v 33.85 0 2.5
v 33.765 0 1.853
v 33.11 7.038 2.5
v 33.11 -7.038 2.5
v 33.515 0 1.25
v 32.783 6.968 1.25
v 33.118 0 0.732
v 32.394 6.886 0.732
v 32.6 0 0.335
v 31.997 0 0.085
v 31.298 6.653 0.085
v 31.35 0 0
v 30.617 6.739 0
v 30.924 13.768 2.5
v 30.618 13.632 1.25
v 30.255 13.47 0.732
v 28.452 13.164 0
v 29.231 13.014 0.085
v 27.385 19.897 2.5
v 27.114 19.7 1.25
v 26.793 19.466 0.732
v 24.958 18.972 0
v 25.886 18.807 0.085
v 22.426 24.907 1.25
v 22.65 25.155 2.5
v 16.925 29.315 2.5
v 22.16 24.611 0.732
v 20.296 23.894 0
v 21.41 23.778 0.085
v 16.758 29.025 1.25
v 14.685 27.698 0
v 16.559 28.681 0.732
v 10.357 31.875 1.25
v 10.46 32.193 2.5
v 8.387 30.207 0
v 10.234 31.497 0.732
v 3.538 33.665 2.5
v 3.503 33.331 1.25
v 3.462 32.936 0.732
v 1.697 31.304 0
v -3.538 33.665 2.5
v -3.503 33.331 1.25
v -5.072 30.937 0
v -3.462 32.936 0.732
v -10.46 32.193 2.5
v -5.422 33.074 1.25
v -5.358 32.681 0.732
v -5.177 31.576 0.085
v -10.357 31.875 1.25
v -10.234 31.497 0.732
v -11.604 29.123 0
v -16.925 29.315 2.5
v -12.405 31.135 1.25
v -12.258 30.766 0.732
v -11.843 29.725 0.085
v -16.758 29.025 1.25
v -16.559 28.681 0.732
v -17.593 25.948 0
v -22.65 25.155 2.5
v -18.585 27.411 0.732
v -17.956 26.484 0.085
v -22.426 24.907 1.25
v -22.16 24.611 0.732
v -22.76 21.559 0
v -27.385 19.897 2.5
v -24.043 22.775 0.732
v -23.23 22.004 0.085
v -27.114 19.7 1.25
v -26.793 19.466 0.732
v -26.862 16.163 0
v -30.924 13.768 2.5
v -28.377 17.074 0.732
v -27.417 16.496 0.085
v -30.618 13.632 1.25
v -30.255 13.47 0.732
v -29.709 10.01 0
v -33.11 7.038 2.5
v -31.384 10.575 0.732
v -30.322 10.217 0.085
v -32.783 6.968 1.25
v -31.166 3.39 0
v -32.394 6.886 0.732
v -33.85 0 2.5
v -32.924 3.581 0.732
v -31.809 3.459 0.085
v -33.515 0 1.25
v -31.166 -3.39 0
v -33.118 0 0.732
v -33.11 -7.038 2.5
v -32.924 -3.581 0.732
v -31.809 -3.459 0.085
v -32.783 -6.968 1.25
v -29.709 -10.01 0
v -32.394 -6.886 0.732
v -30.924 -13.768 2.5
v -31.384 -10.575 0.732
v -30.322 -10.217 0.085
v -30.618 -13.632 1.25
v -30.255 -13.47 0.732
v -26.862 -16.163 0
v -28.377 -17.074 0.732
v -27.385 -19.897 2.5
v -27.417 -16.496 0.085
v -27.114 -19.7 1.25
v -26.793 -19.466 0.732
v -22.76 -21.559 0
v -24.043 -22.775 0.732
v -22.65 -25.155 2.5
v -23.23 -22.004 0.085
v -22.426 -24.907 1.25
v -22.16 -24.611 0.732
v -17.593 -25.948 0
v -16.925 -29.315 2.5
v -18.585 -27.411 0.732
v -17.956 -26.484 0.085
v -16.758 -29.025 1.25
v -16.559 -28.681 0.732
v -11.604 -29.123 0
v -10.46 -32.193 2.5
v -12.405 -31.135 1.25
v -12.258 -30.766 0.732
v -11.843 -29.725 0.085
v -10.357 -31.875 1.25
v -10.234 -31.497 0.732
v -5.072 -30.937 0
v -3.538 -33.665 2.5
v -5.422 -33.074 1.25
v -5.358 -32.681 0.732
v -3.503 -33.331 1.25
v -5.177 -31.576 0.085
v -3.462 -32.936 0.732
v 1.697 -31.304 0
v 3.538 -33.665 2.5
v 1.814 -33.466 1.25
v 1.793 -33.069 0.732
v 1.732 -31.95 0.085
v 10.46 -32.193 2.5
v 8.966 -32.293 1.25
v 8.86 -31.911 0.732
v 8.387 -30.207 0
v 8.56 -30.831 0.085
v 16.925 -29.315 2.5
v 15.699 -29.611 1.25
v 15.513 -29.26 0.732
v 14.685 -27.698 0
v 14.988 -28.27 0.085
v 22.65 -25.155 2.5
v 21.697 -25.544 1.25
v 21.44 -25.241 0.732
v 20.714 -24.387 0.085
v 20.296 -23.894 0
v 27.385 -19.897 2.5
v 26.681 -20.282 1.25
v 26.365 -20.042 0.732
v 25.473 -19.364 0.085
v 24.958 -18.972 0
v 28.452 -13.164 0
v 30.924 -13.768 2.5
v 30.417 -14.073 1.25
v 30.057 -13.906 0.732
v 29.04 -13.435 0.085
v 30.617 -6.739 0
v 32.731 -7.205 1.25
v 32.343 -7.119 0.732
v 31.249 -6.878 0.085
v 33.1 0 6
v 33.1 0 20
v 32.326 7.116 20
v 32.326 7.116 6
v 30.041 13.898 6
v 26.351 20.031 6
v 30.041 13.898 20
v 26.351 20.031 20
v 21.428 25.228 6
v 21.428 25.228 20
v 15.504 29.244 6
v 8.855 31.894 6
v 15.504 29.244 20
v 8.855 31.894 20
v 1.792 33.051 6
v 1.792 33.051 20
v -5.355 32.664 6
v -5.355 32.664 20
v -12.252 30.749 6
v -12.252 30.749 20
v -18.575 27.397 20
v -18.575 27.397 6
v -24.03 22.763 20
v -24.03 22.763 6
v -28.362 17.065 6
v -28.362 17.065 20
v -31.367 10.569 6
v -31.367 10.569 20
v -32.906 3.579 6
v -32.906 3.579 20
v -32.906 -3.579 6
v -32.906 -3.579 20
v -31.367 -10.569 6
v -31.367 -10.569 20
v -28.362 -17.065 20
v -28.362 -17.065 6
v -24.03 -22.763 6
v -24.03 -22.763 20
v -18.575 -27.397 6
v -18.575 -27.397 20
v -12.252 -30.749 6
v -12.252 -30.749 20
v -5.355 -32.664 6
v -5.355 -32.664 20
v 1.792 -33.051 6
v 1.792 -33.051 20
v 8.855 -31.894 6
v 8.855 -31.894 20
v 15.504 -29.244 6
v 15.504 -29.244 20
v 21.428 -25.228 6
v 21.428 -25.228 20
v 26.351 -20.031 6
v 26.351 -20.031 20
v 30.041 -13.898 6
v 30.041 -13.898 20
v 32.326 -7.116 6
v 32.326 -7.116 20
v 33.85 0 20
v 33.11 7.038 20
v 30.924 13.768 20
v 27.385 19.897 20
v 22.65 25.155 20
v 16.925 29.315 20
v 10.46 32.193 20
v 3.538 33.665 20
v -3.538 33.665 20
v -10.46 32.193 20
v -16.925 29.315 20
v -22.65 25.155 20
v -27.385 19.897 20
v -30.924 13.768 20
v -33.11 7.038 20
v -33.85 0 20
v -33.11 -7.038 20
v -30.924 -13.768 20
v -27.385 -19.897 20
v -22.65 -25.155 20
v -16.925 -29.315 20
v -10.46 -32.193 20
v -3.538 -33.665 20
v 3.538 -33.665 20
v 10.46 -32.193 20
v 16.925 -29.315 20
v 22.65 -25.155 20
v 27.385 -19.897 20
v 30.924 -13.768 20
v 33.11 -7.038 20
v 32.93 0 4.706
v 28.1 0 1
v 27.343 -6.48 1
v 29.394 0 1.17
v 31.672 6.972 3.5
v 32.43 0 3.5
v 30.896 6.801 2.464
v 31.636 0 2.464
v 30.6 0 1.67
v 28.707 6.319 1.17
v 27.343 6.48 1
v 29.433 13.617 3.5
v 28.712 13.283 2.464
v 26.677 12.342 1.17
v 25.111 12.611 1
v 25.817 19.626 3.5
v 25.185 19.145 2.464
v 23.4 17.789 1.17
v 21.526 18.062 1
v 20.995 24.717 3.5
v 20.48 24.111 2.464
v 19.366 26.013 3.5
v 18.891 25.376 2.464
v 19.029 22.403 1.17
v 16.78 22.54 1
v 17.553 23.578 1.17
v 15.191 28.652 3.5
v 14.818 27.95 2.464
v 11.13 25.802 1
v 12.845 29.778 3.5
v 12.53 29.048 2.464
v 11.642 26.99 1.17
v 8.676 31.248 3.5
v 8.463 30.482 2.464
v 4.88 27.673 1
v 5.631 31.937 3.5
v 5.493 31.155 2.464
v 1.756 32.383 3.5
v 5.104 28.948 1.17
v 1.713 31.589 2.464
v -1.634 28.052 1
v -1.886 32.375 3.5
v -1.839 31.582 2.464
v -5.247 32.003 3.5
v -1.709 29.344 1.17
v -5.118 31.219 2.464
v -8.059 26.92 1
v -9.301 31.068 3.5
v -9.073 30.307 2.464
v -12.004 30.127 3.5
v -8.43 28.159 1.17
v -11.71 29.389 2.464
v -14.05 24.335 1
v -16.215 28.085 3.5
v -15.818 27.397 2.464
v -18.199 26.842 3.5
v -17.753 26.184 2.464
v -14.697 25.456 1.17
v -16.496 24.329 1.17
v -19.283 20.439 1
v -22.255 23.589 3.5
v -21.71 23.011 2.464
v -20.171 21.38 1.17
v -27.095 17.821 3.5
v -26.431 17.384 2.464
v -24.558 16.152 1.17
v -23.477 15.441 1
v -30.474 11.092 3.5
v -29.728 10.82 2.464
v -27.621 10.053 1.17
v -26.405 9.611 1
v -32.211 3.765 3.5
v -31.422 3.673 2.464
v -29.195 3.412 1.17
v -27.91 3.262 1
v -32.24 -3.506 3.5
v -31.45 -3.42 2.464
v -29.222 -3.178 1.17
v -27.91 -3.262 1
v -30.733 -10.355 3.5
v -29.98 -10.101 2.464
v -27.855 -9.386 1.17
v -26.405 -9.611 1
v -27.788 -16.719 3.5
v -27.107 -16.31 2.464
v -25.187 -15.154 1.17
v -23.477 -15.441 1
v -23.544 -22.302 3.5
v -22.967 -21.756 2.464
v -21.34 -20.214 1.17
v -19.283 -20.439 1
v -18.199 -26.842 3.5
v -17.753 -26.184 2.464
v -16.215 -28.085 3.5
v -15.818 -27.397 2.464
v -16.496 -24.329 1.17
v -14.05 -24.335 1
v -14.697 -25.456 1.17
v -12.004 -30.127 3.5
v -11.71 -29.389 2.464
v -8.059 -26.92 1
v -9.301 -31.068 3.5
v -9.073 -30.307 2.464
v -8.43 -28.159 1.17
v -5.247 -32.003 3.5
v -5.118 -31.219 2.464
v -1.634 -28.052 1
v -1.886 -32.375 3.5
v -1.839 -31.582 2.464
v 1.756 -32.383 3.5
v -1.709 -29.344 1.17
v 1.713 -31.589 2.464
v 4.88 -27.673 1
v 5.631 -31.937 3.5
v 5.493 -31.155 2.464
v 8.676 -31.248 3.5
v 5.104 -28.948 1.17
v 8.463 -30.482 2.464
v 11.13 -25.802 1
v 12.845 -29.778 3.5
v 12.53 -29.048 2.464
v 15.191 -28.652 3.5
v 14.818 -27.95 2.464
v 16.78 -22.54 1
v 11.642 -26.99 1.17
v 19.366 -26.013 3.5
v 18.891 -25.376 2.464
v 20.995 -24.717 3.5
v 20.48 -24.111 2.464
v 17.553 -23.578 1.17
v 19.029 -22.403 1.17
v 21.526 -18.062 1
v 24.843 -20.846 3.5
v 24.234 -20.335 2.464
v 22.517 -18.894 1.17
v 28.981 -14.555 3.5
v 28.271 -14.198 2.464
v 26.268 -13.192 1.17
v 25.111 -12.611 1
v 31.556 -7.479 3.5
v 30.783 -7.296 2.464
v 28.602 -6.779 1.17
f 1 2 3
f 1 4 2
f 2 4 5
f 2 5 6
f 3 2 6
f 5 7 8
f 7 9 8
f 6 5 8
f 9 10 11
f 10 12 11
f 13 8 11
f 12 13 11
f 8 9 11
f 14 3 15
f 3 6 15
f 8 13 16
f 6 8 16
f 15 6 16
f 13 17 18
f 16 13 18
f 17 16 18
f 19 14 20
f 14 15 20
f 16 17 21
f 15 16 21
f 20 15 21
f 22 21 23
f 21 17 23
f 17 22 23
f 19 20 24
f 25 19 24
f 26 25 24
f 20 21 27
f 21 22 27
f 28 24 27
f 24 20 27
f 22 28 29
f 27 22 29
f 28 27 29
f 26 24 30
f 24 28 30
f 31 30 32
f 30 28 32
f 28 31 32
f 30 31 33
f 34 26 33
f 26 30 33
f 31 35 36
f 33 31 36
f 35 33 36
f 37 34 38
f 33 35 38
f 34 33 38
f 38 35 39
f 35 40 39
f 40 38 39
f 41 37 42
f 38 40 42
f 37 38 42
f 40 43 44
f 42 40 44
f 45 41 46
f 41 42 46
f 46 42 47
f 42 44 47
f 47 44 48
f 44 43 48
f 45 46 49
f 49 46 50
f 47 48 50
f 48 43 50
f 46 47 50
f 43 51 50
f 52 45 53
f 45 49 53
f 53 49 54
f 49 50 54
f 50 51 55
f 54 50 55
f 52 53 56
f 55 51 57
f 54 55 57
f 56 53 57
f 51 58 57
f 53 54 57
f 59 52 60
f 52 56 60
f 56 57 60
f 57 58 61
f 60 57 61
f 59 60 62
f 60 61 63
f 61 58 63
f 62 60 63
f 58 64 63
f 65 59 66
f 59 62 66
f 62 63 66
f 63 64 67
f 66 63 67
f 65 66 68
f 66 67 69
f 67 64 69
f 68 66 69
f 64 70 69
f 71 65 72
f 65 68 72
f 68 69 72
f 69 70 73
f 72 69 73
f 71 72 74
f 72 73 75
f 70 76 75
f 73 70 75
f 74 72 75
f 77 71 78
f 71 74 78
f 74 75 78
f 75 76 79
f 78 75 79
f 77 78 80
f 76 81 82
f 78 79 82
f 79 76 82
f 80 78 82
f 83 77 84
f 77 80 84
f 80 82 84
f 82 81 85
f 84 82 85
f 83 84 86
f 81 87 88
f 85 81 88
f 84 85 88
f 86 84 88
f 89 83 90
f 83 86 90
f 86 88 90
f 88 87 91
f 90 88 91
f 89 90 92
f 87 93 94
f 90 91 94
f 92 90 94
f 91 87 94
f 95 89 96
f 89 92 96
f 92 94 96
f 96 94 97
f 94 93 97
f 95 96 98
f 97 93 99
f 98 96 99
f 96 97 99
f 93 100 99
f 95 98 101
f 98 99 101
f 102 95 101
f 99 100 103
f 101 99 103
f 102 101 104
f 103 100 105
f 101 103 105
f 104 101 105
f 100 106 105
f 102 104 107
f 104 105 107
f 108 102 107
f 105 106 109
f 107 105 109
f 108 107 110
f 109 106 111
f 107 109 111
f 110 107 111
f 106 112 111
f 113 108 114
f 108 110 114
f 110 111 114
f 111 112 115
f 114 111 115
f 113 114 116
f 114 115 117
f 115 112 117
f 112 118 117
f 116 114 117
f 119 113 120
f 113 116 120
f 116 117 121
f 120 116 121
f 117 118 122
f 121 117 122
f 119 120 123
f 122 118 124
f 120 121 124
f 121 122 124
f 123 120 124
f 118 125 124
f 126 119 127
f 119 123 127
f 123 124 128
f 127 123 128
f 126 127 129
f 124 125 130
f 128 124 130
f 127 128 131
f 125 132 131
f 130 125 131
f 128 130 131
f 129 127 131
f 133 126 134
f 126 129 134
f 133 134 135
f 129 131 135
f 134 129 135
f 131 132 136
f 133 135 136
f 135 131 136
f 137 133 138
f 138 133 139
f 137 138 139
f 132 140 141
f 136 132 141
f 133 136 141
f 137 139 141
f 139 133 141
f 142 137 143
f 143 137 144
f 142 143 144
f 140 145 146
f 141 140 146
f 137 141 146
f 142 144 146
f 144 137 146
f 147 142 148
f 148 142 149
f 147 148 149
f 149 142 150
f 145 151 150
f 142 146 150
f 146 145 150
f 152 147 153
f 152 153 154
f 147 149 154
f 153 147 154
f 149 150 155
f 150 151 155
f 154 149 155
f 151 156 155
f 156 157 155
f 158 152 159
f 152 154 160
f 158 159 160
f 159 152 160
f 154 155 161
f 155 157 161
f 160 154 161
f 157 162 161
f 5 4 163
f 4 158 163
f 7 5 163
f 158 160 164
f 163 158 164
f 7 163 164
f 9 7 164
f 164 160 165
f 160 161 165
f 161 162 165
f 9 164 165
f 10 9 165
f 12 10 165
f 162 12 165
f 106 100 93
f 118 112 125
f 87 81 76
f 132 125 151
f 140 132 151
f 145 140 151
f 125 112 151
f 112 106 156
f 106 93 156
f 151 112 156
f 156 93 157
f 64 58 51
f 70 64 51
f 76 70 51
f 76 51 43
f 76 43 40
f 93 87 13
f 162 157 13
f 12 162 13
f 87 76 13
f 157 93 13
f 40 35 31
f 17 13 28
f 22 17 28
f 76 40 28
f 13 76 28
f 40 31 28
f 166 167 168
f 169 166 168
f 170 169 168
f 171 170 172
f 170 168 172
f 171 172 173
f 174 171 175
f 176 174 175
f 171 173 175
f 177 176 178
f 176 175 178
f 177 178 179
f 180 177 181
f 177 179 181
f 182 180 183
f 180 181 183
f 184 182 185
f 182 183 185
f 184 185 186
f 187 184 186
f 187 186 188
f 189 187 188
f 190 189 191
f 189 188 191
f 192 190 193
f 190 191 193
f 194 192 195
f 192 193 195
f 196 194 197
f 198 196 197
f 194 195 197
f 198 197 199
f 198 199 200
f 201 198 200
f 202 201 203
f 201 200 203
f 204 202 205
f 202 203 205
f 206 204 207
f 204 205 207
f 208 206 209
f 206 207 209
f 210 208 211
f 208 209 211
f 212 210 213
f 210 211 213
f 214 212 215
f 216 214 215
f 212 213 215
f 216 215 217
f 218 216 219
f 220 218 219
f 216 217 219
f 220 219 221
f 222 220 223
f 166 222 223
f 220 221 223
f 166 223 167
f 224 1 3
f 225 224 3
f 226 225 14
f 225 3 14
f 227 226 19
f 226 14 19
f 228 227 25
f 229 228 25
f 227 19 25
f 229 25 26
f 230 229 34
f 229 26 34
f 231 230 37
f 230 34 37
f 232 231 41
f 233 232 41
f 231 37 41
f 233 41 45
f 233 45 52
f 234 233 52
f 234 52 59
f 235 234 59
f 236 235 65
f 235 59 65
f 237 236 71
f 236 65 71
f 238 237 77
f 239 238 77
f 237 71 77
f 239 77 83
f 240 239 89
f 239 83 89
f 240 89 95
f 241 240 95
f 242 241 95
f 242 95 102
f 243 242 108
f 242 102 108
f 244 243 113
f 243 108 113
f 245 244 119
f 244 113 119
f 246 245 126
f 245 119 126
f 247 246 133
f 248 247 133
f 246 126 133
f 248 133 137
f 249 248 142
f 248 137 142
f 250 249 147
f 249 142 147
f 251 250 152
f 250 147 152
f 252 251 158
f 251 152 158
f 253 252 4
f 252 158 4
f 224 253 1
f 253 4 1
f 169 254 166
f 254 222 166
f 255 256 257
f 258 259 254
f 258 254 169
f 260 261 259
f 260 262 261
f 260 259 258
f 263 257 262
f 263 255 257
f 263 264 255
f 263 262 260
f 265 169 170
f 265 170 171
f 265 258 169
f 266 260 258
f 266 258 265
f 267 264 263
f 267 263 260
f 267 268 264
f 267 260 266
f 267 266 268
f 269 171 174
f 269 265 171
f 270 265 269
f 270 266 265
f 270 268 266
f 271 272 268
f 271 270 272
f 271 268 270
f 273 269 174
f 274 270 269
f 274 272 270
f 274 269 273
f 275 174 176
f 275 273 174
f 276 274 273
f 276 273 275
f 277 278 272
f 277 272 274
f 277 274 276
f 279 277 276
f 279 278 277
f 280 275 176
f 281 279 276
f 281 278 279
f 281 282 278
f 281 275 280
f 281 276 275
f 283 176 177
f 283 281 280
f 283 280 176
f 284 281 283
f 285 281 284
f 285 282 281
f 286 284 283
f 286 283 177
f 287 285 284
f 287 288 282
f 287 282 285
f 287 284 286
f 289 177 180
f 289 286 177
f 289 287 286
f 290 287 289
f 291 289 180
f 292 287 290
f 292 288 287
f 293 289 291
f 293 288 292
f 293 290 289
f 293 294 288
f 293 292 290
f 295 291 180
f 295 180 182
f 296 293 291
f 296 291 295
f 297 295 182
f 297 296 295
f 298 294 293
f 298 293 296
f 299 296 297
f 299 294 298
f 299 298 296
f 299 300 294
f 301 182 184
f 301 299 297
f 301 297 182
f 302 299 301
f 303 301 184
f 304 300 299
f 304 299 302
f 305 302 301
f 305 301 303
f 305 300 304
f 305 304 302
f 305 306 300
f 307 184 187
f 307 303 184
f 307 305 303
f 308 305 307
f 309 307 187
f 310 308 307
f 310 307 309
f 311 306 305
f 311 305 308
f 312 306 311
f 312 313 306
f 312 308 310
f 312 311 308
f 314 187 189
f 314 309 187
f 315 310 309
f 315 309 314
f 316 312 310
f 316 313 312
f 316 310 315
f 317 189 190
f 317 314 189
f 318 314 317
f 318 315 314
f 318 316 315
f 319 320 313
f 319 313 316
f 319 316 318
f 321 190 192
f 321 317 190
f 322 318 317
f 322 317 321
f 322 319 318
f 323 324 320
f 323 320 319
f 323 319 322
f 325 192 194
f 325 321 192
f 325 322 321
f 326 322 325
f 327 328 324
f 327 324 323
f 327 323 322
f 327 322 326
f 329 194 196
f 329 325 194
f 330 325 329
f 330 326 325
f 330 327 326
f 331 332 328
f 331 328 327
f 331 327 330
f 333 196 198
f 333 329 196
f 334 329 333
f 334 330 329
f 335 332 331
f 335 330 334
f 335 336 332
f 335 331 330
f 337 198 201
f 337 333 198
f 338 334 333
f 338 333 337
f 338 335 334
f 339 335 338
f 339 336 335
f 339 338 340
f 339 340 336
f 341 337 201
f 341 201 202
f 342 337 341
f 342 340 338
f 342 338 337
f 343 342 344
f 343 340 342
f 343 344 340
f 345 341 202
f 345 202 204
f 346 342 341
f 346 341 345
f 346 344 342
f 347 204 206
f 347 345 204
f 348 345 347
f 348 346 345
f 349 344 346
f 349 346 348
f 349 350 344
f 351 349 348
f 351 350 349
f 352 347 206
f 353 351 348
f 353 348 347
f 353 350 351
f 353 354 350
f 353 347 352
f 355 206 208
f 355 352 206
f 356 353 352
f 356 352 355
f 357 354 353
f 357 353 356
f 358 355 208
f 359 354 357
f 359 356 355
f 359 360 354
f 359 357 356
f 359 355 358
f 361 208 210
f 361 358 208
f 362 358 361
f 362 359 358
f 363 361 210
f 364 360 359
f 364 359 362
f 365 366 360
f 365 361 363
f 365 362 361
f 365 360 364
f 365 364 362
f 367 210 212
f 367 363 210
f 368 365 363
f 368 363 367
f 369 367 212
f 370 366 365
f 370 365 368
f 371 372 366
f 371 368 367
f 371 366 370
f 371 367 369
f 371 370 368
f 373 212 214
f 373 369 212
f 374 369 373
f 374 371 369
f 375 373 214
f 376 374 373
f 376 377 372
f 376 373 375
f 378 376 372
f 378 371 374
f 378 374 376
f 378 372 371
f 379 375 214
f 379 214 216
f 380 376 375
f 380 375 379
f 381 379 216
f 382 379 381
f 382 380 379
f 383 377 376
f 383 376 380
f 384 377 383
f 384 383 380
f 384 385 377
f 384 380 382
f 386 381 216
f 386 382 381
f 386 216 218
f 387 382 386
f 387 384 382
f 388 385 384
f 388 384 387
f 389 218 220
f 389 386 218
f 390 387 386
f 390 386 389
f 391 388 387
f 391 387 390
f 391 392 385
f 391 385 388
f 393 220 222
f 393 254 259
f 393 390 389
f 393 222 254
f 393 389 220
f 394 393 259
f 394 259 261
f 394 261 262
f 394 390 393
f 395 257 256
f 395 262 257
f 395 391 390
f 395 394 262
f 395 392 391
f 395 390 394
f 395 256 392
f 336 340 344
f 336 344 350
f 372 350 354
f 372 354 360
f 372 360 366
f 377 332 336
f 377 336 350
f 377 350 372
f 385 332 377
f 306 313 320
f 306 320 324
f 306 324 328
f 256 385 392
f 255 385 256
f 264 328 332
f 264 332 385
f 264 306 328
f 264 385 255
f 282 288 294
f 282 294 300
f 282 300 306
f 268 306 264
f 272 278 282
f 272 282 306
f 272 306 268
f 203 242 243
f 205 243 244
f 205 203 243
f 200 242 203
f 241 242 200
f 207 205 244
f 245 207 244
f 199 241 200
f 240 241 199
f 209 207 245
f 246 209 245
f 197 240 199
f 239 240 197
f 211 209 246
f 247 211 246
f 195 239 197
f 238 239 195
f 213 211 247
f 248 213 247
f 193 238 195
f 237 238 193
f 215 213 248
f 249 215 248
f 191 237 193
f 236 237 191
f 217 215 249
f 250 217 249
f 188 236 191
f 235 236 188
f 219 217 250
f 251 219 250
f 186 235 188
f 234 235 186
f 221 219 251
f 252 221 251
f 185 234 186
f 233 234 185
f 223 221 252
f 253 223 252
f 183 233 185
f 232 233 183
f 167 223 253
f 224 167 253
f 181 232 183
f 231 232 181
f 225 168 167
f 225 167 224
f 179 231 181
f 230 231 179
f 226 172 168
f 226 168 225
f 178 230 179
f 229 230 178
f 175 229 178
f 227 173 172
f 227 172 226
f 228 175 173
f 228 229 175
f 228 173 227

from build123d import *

# Parameters (mm, degrees)
F0_R     = 33.85
F1_DEPTH = 20
F2_R     = 33.1
F3_DEPTH = 19
F4_R     = 5
F5_R     = 2.5


with BuildPart() as f1:
    # F0 (on Top) → F1 (new body)
    with BuildSketch(Plane.XY):
        Circle(F0_R)
    extrude(amount=F1_DEPTH)

    # F2 (on face) → F3 (cut)
    with BuildSketch(Plane.XY.offset(20)):
        Circle(F2_R)
    extrude(amount=-F3_DEPTH, mode=Mode.SUBTRACT)

    # F4
    f4_edges = [f1.edges().sort_by_distance(p)[0] for p in [
        (-33.1, 0, 1),
    ]]
    fillet(f4_edges, radius=F4_R)

    # F5
    f5_edges = [f1.edges().sort_by_distance(p)[0] for p in [
        (-33.85, 0, 0),
    ]]
    fillet(f5_edges, radius=F5_R)


solid = f1.part
